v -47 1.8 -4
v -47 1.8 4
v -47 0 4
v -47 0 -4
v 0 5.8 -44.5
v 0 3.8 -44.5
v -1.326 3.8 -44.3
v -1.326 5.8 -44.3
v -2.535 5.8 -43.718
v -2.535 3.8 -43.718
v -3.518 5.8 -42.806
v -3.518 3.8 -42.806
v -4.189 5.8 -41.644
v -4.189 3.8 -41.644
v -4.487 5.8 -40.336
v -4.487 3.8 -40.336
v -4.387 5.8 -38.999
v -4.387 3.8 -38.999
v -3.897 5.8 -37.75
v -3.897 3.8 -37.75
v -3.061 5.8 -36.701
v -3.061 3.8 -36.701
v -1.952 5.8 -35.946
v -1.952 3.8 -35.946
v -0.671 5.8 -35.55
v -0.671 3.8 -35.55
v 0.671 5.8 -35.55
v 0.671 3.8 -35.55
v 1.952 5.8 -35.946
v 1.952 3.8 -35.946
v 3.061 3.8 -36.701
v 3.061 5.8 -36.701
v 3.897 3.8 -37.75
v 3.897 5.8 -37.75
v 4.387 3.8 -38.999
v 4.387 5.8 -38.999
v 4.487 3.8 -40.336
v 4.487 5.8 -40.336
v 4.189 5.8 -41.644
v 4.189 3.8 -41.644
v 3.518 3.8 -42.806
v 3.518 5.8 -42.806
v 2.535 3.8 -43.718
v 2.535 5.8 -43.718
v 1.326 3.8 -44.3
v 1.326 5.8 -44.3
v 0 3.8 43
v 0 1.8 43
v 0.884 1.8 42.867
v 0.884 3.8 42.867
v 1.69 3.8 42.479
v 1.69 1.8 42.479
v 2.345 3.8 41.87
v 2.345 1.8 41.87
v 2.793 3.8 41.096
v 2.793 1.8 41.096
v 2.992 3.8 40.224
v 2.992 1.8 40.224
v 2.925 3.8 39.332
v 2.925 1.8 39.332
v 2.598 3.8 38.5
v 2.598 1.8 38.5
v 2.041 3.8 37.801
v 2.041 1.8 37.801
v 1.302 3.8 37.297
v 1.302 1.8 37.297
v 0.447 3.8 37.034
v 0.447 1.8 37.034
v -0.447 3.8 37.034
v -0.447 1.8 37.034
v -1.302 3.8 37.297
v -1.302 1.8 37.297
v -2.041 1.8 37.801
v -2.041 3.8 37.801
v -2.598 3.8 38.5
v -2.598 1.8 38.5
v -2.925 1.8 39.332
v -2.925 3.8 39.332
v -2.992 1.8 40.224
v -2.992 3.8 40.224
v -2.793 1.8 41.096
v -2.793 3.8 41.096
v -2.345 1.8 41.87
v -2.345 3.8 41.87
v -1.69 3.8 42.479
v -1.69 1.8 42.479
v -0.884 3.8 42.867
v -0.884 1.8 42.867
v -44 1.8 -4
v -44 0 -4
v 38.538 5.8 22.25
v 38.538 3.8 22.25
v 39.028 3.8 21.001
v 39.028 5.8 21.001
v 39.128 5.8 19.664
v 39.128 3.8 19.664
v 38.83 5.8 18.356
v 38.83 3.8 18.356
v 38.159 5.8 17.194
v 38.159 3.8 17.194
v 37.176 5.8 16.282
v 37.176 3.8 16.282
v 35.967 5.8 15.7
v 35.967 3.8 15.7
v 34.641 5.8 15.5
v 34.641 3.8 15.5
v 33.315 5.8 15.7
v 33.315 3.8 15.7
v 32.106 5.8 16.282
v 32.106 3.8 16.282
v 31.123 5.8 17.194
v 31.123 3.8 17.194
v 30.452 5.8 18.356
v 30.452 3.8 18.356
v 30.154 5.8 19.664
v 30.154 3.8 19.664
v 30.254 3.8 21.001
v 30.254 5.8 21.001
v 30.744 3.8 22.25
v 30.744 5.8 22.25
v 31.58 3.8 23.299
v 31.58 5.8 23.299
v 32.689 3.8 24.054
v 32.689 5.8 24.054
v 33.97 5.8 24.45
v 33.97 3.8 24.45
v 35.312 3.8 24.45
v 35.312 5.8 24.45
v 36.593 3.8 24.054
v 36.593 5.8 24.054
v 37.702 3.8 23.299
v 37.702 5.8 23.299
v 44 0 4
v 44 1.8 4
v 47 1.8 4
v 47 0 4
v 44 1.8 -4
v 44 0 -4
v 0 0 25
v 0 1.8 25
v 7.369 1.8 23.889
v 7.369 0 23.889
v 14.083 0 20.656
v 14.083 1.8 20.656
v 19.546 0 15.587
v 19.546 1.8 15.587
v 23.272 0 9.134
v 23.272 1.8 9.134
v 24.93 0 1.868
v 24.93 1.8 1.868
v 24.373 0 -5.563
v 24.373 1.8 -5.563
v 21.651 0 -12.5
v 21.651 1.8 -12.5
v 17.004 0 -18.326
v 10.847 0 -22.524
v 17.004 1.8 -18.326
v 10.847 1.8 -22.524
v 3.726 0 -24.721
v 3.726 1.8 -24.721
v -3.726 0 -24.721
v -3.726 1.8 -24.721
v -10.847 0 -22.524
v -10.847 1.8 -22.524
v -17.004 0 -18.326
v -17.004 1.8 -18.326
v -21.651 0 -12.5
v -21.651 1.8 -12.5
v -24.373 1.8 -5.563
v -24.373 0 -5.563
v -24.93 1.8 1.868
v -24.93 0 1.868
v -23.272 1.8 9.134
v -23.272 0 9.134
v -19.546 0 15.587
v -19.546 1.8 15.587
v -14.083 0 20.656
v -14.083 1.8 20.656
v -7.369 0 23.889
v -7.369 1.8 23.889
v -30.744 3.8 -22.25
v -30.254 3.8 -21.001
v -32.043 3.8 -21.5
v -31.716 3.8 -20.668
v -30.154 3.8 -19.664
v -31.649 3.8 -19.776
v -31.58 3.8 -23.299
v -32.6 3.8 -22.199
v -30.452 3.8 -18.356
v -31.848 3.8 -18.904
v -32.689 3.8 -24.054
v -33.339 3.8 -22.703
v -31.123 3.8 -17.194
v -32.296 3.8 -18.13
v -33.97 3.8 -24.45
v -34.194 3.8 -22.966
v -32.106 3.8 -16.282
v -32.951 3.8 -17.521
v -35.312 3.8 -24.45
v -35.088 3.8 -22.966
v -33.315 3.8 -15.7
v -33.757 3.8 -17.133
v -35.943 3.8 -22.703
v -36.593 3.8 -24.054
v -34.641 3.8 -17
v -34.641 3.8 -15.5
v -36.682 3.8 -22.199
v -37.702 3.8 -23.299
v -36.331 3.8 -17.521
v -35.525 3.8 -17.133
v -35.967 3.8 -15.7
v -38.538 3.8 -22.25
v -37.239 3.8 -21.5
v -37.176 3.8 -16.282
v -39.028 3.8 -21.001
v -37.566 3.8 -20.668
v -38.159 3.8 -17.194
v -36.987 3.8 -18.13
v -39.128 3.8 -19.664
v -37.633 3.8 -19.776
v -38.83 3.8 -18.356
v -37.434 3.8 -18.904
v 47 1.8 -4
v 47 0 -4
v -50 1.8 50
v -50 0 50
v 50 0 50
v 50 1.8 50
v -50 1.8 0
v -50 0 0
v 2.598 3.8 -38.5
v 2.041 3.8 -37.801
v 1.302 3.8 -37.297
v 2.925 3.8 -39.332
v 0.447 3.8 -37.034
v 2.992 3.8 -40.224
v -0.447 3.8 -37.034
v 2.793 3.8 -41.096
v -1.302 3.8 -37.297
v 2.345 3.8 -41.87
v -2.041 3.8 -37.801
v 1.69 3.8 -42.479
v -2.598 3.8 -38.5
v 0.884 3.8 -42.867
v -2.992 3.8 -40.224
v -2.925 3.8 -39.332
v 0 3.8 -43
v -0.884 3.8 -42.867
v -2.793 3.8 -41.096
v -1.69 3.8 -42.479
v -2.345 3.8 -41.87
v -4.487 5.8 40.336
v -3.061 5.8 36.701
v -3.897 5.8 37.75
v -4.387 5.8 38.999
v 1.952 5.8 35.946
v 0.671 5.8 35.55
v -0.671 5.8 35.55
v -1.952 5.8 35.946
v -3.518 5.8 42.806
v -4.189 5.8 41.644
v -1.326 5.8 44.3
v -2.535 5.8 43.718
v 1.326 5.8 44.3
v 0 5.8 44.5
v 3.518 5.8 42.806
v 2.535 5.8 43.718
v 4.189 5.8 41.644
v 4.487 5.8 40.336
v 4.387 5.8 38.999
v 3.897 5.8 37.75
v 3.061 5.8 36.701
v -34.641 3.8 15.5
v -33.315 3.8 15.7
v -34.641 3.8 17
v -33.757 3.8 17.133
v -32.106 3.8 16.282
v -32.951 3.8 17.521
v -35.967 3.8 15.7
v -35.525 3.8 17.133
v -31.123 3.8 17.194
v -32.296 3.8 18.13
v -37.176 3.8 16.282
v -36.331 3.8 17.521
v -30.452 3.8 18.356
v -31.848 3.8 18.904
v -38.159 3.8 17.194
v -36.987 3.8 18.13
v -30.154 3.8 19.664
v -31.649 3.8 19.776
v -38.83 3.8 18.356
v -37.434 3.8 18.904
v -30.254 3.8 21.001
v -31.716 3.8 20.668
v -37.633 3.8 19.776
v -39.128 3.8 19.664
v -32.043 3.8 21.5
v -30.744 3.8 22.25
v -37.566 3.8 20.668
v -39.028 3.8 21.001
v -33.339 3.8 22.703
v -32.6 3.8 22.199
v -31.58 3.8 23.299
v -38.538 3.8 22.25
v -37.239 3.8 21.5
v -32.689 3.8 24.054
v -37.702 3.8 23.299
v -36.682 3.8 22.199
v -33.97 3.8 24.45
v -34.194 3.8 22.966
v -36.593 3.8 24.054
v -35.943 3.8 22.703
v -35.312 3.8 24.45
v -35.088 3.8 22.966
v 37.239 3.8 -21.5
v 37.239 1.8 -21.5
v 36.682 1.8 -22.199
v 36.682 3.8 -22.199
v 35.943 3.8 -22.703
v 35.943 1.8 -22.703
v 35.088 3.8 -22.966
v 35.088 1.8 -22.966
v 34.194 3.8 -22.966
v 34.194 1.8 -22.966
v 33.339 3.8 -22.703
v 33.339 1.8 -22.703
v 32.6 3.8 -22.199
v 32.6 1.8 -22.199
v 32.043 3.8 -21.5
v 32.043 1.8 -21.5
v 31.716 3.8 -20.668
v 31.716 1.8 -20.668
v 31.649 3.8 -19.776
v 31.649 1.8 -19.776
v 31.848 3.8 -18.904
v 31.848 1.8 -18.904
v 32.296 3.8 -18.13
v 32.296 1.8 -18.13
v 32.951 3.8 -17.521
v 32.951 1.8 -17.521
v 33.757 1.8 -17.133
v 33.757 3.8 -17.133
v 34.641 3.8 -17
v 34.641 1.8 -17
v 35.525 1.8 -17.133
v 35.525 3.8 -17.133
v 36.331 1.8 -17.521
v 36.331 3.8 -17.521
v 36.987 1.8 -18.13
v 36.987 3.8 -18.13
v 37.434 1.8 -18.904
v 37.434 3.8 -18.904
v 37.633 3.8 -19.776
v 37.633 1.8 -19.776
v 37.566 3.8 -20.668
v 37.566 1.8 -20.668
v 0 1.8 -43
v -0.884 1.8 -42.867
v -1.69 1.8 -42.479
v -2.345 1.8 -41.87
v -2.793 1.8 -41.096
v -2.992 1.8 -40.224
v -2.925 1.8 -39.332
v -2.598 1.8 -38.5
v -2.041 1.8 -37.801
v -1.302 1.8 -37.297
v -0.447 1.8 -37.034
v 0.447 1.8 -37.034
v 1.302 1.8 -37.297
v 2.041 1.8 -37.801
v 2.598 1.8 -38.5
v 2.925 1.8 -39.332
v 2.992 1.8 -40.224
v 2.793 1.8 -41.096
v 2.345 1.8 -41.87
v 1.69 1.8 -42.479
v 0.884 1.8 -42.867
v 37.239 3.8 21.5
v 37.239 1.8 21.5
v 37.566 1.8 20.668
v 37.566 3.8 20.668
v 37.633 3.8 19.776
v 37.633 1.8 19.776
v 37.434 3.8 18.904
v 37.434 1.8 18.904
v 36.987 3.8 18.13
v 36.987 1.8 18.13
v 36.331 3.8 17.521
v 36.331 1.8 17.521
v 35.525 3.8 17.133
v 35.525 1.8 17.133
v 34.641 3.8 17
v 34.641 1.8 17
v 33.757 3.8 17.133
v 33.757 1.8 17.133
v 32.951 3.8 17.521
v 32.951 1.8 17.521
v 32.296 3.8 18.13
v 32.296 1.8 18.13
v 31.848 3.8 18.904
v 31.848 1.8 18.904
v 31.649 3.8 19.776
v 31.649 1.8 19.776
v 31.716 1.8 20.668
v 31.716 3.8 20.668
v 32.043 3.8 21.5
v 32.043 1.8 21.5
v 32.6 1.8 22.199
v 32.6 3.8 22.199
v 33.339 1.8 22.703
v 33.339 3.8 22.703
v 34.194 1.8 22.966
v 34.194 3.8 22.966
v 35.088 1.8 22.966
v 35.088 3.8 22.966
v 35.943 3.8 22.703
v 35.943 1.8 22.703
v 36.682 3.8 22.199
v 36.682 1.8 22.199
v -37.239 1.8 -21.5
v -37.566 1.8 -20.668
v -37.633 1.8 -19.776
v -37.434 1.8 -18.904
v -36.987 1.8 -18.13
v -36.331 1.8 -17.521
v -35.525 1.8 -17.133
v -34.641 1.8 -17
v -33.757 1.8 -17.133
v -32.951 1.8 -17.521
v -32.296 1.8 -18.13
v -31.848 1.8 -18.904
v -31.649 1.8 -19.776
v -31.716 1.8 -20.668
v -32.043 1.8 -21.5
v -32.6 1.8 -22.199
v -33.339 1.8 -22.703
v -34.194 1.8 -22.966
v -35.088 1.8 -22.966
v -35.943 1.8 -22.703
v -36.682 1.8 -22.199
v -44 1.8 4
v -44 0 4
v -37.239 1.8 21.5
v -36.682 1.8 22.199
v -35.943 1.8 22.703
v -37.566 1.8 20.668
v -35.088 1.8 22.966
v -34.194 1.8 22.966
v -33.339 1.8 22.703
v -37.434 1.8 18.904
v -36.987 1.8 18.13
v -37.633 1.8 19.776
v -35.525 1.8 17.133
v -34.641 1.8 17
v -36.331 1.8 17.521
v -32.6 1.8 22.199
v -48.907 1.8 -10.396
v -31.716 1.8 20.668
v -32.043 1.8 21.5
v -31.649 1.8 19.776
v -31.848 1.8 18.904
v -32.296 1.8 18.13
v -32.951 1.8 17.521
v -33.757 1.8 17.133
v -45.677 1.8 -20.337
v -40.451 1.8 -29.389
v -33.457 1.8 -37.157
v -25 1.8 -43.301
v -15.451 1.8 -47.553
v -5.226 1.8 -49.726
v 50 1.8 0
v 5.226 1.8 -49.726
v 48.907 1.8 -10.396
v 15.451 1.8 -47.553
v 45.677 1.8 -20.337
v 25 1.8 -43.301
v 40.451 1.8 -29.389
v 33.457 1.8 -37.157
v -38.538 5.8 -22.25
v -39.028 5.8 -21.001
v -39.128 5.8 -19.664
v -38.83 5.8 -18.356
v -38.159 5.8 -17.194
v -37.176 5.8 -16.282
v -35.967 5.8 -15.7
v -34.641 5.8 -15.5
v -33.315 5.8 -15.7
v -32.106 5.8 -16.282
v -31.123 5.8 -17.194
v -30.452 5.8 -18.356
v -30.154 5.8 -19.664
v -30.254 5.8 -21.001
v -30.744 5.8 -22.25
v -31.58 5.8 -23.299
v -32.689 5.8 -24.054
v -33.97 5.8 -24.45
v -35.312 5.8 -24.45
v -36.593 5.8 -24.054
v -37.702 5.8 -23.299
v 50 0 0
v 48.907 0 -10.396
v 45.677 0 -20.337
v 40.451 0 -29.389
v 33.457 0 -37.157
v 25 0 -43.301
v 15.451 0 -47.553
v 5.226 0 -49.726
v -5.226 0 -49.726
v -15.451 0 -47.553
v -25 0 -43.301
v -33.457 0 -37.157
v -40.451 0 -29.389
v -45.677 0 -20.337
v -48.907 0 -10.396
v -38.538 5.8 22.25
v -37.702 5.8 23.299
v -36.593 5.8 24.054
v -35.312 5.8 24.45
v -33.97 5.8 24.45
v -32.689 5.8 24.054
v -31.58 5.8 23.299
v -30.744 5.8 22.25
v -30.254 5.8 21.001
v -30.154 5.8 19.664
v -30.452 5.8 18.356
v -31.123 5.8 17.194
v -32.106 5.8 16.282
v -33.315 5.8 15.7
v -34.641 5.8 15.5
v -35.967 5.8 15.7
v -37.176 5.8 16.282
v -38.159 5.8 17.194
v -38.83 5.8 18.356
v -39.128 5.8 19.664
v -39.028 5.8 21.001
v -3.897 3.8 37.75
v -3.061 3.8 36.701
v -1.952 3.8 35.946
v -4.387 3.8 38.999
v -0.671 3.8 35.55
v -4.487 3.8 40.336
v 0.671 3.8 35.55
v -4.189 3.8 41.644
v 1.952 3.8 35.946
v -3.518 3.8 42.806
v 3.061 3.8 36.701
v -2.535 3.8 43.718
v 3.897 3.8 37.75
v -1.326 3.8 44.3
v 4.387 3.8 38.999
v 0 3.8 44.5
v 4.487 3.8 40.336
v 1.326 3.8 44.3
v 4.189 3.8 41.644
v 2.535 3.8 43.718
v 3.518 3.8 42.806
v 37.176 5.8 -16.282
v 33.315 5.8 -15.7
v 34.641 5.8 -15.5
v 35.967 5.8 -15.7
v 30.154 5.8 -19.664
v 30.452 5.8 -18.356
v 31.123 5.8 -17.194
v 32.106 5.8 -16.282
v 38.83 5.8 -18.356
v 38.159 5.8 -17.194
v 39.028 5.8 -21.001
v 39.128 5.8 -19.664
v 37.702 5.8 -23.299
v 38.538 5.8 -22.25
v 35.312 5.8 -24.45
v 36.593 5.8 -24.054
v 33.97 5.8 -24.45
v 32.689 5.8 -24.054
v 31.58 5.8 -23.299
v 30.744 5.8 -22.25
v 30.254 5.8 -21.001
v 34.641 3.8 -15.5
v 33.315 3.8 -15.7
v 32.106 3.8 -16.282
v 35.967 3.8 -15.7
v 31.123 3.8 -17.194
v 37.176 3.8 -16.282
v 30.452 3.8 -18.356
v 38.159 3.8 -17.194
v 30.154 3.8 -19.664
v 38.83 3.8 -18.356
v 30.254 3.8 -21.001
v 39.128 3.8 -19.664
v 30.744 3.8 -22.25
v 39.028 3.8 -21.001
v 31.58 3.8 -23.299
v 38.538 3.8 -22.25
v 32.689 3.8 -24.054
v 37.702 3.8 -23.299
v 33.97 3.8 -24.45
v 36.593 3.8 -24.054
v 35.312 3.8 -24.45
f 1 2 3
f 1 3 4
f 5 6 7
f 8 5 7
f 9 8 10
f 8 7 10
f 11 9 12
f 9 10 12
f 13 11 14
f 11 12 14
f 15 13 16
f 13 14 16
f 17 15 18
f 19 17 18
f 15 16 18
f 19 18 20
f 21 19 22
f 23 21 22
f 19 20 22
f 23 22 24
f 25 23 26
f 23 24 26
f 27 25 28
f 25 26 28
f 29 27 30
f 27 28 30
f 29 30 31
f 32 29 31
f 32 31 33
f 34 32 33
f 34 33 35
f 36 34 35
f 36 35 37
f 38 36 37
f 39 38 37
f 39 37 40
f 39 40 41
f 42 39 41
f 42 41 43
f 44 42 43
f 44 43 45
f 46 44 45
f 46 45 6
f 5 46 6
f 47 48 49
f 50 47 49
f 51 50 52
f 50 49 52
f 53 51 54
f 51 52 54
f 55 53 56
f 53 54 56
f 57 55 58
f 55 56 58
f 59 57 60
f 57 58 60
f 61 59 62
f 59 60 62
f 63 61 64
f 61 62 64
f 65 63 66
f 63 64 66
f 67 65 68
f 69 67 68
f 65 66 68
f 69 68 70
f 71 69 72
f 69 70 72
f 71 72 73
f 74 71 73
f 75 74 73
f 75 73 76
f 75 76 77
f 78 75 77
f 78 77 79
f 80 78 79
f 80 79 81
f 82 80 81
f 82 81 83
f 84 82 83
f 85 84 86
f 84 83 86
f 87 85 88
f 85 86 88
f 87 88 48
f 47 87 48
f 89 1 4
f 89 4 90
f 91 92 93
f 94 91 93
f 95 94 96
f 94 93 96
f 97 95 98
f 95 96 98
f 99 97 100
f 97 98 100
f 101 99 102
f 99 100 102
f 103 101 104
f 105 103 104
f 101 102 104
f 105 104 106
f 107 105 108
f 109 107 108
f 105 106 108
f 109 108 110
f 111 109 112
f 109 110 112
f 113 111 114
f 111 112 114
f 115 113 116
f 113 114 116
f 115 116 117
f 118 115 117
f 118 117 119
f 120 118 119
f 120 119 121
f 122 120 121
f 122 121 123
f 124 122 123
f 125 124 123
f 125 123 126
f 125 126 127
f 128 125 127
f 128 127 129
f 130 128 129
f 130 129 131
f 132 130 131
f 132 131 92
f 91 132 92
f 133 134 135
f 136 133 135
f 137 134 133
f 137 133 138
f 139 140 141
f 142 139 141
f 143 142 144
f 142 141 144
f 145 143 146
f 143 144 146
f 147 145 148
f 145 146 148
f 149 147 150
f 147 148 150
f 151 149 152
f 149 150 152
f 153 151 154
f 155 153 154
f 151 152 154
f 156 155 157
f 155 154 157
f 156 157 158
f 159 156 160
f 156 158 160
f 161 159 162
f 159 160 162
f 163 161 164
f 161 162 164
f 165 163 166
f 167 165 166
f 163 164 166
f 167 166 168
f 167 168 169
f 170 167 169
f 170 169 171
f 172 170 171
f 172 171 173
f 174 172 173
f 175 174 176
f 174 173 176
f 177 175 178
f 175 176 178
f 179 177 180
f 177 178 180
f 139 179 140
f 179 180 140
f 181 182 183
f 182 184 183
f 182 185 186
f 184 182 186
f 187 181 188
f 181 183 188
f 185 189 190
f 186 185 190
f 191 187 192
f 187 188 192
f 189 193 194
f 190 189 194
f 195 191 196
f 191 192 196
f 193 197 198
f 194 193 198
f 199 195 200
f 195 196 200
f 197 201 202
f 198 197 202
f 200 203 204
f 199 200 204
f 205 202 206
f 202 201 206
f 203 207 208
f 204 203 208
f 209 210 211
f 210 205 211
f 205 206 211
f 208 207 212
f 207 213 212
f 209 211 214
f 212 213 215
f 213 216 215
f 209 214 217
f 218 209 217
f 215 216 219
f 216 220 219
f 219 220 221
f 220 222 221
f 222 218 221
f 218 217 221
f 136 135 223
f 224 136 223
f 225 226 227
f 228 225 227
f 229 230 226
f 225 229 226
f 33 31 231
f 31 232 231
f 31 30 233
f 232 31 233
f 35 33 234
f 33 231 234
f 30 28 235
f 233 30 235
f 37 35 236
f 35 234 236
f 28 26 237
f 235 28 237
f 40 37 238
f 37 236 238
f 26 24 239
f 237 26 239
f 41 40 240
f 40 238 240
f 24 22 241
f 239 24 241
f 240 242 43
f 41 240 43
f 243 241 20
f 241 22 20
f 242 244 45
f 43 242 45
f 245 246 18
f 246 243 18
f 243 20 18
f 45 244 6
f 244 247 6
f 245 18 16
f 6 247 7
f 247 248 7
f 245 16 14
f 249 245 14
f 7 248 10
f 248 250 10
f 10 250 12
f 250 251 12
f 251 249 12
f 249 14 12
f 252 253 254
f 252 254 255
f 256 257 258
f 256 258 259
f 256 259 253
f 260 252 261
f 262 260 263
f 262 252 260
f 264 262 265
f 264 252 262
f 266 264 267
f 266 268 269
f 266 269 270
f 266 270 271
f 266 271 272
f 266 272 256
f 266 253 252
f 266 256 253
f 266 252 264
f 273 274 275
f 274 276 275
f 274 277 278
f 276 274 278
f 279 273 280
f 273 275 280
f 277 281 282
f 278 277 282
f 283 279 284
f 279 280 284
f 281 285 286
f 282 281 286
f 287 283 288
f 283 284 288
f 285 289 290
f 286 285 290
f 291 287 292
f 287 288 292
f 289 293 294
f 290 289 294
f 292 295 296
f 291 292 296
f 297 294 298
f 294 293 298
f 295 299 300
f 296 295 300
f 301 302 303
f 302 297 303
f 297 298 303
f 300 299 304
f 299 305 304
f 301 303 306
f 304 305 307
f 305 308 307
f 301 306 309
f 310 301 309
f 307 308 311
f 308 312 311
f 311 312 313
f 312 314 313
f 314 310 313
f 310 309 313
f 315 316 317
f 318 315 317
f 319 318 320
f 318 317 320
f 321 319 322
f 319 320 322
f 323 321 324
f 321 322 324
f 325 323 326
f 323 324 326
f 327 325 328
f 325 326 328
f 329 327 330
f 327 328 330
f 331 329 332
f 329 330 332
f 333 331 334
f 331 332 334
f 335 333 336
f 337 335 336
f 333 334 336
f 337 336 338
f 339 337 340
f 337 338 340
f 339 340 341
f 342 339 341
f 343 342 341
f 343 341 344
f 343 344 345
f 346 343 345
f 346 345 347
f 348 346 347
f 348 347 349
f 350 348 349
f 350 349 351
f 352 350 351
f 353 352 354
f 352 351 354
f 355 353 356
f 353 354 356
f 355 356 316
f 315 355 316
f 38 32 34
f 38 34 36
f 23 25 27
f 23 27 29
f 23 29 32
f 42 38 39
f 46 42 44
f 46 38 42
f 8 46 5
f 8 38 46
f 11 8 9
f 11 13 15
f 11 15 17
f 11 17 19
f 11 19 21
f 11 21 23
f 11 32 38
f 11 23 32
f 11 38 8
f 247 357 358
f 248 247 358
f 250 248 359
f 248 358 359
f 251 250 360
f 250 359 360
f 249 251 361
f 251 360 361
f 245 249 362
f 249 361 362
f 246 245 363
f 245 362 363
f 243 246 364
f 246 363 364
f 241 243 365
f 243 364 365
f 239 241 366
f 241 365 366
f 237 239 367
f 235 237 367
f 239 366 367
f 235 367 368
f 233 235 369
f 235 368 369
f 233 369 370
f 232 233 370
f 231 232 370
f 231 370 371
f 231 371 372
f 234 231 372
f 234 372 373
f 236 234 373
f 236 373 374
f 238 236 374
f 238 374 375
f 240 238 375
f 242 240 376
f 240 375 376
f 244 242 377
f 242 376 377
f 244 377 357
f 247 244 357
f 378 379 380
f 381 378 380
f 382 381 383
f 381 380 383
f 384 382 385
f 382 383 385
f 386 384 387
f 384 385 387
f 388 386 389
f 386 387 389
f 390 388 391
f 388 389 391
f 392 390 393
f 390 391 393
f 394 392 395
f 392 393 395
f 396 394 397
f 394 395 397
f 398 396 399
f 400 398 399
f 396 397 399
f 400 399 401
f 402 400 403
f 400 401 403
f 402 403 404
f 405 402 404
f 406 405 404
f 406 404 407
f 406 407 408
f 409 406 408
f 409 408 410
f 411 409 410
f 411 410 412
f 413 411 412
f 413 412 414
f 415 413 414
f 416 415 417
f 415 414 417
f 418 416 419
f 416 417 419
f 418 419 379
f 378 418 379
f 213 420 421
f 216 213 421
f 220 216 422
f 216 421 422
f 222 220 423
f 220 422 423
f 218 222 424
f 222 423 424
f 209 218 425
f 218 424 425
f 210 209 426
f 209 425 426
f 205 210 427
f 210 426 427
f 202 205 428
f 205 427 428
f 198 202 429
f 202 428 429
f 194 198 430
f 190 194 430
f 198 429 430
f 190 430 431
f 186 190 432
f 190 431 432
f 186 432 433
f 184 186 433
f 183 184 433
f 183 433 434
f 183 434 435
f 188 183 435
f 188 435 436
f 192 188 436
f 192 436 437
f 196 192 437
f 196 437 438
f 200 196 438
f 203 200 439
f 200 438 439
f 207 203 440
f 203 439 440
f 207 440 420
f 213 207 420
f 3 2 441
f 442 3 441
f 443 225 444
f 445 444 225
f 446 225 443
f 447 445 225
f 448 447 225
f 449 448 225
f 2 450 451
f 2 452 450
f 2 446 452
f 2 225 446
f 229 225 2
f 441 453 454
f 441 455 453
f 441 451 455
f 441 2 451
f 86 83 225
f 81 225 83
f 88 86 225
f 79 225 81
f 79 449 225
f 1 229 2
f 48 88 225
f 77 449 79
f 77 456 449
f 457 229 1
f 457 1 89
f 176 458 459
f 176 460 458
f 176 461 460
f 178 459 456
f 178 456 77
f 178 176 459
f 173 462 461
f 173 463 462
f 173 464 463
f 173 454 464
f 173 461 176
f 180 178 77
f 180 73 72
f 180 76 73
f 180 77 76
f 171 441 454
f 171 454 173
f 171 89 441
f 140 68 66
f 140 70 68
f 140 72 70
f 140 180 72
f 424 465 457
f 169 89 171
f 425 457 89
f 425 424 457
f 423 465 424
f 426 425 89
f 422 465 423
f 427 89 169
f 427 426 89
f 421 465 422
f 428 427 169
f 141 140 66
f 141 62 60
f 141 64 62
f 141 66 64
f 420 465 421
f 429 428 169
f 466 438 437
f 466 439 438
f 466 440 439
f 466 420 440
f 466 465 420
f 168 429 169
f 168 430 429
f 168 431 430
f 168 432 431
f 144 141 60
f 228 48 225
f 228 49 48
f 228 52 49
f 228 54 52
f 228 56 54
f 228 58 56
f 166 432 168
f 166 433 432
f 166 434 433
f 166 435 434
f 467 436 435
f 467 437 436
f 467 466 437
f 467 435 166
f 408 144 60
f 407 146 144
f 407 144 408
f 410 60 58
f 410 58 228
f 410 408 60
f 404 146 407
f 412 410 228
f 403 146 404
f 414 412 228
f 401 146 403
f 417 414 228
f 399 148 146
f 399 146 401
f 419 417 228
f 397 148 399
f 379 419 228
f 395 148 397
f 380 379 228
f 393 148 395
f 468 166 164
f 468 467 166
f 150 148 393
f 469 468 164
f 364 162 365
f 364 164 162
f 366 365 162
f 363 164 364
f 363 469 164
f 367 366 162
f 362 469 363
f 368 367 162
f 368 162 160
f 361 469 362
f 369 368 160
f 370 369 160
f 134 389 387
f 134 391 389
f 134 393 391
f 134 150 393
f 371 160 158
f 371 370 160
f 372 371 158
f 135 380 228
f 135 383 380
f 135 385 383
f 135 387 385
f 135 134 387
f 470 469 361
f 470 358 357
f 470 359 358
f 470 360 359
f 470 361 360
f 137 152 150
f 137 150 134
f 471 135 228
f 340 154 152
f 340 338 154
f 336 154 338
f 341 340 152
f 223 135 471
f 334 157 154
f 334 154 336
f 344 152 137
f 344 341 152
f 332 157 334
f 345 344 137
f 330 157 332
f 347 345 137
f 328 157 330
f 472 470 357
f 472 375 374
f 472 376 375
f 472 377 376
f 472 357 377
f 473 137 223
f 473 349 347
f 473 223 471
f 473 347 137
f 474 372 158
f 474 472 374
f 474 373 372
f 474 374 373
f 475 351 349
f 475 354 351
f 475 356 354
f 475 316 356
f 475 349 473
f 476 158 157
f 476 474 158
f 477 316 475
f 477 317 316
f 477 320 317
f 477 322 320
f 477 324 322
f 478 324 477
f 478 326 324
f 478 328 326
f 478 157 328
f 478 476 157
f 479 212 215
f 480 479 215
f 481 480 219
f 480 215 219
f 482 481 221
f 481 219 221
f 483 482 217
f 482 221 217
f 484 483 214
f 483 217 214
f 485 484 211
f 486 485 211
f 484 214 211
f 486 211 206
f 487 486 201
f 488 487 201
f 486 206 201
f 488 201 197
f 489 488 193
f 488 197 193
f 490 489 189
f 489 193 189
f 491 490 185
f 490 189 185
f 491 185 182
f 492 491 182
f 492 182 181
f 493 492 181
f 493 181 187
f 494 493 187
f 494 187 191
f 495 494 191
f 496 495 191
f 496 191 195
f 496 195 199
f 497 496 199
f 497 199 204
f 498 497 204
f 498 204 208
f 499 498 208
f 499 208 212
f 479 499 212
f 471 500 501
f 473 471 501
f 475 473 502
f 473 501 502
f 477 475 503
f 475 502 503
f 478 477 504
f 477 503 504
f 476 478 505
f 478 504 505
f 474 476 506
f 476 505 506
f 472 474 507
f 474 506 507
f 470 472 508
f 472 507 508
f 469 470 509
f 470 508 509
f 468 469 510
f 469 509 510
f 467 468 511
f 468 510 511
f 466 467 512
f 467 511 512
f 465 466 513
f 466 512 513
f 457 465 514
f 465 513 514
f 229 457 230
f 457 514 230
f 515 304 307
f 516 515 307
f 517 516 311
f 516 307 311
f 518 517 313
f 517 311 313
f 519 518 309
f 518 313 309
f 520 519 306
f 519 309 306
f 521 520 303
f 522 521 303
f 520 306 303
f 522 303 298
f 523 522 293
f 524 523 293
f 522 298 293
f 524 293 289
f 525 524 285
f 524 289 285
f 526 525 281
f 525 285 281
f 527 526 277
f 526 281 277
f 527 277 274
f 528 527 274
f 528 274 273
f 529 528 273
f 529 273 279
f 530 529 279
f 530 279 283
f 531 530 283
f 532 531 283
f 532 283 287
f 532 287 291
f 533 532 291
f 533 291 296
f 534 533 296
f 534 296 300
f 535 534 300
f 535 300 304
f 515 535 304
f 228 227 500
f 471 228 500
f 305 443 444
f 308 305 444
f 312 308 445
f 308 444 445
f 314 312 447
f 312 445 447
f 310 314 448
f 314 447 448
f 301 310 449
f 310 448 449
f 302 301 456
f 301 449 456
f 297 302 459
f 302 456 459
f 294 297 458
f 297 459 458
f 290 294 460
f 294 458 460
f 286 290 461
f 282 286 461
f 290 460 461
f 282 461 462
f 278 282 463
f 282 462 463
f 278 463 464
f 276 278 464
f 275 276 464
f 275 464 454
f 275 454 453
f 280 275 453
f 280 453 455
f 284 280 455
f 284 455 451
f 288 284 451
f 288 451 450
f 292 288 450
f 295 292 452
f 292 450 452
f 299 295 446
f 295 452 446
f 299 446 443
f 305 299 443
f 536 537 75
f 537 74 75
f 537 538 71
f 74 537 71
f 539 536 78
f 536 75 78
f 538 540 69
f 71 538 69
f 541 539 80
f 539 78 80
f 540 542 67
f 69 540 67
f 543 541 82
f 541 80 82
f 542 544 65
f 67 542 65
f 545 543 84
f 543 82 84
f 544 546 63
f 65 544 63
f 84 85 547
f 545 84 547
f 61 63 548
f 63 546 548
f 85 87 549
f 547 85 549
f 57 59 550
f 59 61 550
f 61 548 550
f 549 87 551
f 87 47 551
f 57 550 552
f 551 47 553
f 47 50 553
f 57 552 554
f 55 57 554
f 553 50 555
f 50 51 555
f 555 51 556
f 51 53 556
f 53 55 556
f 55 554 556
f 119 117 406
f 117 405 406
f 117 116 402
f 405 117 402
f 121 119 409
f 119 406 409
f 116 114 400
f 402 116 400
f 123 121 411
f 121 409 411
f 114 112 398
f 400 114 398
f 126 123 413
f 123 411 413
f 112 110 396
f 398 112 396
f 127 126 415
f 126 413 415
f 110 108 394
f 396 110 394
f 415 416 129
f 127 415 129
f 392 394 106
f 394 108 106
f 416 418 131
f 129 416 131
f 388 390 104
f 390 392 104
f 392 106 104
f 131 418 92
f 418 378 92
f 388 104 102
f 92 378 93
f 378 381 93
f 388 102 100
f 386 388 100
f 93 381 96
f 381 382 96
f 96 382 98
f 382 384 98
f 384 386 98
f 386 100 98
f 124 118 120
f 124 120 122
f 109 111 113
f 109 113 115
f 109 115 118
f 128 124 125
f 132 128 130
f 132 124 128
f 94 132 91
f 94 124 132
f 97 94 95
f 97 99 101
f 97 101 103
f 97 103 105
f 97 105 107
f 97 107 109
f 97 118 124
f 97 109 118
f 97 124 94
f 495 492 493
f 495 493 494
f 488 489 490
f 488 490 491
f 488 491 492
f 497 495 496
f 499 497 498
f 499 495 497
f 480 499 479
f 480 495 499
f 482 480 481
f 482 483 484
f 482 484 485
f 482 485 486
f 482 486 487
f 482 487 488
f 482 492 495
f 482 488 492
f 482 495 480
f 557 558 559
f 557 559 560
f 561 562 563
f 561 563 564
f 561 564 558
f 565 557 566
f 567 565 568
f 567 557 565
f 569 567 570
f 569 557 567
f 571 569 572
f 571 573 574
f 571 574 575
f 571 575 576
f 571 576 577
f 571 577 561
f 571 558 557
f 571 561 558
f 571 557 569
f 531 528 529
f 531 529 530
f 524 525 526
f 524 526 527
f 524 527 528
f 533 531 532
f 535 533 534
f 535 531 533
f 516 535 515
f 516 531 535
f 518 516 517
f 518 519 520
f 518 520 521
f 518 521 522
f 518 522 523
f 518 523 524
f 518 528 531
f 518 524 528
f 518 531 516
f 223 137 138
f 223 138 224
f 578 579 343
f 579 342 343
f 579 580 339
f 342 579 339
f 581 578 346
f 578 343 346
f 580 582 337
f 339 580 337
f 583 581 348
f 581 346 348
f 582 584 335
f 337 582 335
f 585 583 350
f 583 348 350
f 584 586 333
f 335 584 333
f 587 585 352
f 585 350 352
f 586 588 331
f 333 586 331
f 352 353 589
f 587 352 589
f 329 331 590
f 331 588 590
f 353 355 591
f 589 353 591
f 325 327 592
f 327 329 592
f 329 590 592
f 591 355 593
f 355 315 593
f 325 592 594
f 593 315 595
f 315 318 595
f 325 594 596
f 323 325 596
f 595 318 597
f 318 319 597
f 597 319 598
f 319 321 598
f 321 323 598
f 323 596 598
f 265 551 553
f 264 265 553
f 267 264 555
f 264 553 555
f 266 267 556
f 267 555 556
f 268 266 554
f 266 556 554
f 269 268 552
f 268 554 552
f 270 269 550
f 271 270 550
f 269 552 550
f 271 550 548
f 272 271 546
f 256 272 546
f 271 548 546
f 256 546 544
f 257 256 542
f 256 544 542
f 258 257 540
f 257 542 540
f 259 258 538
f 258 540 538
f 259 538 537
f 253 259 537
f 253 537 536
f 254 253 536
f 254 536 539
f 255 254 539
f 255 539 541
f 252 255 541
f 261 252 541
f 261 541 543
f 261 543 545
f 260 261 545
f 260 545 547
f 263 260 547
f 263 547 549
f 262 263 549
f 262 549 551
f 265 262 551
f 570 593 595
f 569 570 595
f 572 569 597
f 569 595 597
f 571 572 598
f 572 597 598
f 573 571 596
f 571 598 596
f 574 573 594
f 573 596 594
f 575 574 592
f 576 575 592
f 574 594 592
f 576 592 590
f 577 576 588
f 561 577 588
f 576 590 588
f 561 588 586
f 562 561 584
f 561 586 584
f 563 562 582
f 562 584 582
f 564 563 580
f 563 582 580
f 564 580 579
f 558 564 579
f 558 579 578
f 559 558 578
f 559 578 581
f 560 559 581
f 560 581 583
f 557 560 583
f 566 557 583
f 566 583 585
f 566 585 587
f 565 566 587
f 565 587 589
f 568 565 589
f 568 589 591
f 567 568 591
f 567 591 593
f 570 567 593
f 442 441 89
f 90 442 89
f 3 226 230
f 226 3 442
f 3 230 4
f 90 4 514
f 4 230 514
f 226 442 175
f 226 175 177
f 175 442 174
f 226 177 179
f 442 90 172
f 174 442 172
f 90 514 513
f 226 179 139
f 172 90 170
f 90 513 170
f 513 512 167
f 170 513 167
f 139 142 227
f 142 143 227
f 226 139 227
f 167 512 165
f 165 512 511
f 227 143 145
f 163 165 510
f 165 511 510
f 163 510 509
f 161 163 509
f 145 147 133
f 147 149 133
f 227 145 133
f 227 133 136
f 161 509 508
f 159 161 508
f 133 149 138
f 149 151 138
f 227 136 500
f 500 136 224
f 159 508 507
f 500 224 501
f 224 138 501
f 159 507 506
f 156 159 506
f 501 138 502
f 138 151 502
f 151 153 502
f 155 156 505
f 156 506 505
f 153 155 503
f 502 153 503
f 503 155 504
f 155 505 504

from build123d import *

# Parameters (mm, degrees)
BOSS_EXTRUDE1_DEPTH = 1.8
SKETCH2_R           = 25
CUT_EXTRUDE1_DEPTH  = 1.8
SKETCH2_3_R         = 4.5
BOSS_EXTRUDE2_DEPTH = 4
SKETCH2_4_R         = 4.5
SKETCH2_4_R_2       = 3
CUT_EXTRUDE2_DEPTH  = 2
CIRPATTERN1_COUNT   = 12
SKETCH5_W           = 3
SKETCH5_H           = 8
CUT_EXTRUDE3_DEPTH  = 1.8


with BuildPart() as part:
    # Sketch1 → Boss-Extrude1 (new body)
    with BuildSketch(Plane(origin=(0, 0, 0), x_dir=(1, 0, 0), z_dir=(0, 1, 0))):
        with BuildLine():
            Line((-50, 0), (-50, -50))
            Line((-50, -50), (50, -50))
            Line((50, -50), (50, 0))
            ThreePointArc((50, 0), (0, 50), (-50, 0))
        make_face()
    extrude(amount=BOSS_EXTRUDE1_DEPTH)

    # Sketch2 → Cut-Extrude1 (cut)
    with BuildSketch(Plane(origin=(0, 1.8, 0), x_dir=(1, 0, 0), z_dir=(0, 1, 0))):
        with Locations(Location((0, 0, 0), (0, 0, 270))):
            Circle(SKETCH2_R)
    extrude(amount=-CUT_EXTRUDE1_DEPTH, mode=Mode.SUBTRACT)

    # Sketch2<3> → Boss-Extrude2 (add)
    with BuildSketch(Plane(origin=(0, 1.8, 0), x_dir=(1, 0, 0), z_dir=(0, 1, 0))):
        with Locations(Location((0, -40, 0), (0, 0, 270))):
            Circle(SKETCH2_3_R)
    boss_extrude2 = extrude(amount=BOSS_EXTRUDE2_DEPTH)

    # Sketch2<4> → Cut-Extrude2 (cut)
    with BuildSketch(Plane(origin=(0, 1.8, 0), x_dir=(1, 0, 0), z_dir=(0, 1, 0))):
        with Locations(Location((0, -40, 0), (0, 0, 270))):
            Circle(SKETCH2_4_R)
        with Locations(Location((0, -40, 0), (0, 0, 270))):
            Circle(SKETCH2_4_R_2, mode=Mode.SUBTRACT)
    cut_extrude2 = extrude(amount=CUT_EXTRUDE2_DEPTH, mode=Mode.SUBTRACT)

    # CirPattern1: Boss-Extrude2, Cut-Extrude2 ×12 about axis, 6 skipped
    cirpattern1_axis = Axis((0, -70.710678119, 0), (0, 1, 0))
    add([boss_extrude2.rotate(cirpattern1_axis, i * 360 / CIRPATTERN1_COUNT) for i in range(1, CIRPATTERN1_COUNT) if i not in (1, 3, 5, 7, 9, 11)])
    add([cut_extrude2.rotate(cirpattern1_axis, i * 360 / CIRPATTERN1_COUNT) for i in range(1, CIRPATTERN1_COUNT) if i not in (1, 3, 5, 7, 9, 11)], mode=Mode.SUBTRACT)

    # Sketch5 → Cut-Extrude3 (cut)
    with BuildSketch(Plane(origin=(0, 1.8, 0), x_dir=(1, 0, 0), z_dir=(0, 1, 0))):
        with Locations((-45.5, 0)):
            Rectangle(SKETCH5_W, SKETCH5_H)
        with Locations((45.5, 0)):
            Rectangle(SKETCH5_W, SKETCH5_H)
    extrude(amount=-CUT_EXTRUDE3_DEPTH, mode=Mode.SUBTRACT)


solid = part.part
